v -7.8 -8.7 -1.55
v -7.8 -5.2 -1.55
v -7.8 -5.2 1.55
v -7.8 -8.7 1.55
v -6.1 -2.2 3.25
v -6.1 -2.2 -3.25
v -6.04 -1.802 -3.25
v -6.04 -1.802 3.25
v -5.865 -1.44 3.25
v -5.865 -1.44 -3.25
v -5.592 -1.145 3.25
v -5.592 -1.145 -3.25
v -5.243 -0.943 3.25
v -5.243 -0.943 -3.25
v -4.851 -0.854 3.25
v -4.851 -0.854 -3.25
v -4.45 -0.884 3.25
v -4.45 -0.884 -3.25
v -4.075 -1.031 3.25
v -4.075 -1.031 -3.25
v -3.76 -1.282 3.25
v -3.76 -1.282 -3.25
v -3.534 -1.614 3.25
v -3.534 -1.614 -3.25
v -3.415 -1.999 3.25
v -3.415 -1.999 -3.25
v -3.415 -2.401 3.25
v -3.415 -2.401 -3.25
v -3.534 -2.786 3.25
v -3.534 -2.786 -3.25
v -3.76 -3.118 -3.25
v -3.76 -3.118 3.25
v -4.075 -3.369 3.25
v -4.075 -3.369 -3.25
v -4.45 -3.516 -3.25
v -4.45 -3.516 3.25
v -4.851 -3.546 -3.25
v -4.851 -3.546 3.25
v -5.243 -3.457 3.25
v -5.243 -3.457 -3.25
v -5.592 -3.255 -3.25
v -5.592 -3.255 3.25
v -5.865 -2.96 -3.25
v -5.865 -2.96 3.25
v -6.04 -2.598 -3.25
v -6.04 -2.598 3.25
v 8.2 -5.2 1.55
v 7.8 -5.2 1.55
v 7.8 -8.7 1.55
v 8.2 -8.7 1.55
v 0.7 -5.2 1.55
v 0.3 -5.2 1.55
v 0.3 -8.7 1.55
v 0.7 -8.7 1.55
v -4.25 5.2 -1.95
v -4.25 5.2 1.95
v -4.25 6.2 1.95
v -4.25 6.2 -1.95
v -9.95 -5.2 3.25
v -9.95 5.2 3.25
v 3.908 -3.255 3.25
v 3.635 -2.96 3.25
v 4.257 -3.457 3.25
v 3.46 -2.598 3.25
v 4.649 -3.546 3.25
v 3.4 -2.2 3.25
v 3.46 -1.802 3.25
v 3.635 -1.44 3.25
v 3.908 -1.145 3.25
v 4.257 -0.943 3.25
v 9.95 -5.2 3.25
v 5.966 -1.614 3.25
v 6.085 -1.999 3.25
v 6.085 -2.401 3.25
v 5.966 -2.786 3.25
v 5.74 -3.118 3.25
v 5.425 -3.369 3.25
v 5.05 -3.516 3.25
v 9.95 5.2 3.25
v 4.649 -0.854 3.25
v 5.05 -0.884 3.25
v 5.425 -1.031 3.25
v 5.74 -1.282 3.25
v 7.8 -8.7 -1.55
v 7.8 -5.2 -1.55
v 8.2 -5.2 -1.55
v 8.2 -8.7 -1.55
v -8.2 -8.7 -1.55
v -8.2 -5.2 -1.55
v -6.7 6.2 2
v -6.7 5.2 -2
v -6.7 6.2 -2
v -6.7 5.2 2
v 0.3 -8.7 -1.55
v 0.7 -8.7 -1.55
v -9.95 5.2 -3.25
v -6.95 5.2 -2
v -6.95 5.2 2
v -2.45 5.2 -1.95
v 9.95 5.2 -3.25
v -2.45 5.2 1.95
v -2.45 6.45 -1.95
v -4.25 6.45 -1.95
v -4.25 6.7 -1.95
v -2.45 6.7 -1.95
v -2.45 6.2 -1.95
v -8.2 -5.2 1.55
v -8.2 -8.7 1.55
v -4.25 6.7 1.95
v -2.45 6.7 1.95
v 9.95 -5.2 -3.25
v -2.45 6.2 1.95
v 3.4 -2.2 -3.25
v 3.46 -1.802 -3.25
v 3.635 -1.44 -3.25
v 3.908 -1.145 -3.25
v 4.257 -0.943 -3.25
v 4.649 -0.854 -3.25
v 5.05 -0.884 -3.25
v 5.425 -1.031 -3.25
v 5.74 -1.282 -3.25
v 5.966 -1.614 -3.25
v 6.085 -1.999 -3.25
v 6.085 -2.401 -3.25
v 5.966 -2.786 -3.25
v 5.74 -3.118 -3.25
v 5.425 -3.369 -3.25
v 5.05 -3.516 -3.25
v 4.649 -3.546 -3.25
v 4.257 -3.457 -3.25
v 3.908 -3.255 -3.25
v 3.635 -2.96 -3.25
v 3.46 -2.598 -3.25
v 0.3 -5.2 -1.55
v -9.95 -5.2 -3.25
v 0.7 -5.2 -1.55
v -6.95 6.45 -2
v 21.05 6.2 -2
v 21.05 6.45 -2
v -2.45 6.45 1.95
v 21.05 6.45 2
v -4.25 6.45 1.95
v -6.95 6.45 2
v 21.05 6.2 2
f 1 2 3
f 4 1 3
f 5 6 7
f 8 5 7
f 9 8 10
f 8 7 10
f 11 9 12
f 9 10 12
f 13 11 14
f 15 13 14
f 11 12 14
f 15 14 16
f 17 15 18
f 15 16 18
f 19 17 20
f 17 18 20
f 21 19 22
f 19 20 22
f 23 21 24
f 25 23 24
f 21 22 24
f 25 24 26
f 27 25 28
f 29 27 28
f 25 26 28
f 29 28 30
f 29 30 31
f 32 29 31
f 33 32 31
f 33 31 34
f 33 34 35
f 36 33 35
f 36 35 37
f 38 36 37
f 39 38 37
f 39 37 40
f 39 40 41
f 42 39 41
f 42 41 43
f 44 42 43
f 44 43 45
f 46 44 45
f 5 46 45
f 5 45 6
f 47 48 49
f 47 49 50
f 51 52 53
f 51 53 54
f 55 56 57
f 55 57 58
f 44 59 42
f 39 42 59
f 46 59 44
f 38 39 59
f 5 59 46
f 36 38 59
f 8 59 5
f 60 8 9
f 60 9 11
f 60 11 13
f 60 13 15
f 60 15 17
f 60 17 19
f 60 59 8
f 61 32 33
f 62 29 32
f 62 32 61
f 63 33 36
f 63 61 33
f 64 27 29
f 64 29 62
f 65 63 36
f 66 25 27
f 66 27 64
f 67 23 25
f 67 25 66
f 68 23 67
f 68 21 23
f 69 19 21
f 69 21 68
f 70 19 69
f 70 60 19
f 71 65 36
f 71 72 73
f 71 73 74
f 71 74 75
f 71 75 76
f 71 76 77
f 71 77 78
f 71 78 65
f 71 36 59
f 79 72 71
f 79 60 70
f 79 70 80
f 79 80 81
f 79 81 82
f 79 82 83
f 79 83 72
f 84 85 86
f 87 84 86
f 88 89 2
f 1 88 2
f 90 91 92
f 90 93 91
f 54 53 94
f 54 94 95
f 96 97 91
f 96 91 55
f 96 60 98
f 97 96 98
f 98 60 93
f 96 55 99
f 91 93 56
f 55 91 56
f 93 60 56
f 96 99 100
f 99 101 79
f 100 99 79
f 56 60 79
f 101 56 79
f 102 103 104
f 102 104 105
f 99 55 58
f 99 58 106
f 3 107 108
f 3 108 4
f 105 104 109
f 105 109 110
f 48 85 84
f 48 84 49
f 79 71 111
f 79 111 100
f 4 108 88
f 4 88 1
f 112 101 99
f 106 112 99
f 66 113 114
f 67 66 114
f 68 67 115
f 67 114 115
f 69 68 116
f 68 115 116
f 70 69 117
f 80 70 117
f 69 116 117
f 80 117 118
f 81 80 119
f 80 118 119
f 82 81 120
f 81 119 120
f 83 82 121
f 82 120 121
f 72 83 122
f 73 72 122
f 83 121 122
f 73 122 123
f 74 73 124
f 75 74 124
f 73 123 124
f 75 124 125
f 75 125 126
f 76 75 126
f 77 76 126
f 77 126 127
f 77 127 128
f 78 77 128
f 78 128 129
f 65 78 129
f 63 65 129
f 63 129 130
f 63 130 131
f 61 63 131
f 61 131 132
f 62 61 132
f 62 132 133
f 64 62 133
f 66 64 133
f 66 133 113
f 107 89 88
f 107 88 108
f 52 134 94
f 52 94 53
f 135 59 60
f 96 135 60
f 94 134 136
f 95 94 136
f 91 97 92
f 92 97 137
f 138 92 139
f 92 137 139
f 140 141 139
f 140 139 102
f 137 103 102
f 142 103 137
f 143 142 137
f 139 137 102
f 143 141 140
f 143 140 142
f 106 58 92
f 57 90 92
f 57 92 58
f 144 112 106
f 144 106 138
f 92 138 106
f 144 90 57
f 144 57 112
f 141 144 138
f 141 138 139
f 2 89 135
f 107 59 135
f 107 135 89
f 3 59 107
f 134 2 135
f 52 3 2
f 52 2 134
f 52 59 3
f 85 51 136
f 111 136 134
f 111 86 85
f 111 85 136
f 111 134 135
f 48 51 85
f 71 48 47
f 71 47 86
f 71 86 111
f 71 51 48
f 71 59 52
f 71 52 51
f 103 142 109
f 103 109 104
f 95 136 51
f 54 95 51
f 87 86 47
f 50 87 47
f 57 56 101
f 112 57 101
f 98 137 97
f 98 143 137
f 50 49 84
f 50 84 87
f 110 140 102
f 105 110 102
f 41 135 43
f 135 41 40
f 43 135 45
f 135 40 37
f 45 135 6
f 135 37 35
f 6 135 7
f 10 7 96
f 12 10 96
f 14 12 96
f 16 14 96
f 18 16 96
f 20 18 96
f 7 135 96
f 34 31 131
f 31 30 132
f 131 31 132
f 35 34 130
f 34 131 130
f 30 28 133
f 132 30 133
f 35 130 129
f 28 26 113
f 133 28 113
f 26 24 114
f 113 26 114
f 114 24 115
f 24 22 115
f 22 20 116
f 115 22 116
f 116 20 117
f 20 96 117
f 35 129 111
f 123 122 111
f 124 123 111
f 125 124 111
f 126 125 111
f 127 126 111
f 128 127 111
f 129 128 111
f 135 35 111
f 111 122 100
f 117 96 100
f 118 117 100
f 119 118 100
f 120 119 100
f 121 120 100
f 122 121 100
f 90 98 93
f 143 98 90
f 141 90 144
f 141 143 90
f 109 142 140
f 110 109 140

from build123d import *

# Parameters (mm, degrees)
ESQUISSE1_W        = 19.9
ESQUISSE1_H        = 10.4
BOSS_EXTRU_1_DEPTH = 3.25
D_GAGEMENT_M2_51_D = 2.7
ESQUISSE4_W        = 0.4
ESQUISSE4_H        = 3.1
BOSS_EXTRU_2_DEPTH = 3.5
ESQUISSE5_W        = 1.8
ESQUISSE5_H        = 3.9
BOSS_EXTRU_3_DEPTH = 1.5
BOSS_EXTRU_4_DEPTH = 2


with BuildPart() as part:
    # Esquisse1 → Boss.-Extru.1 (new, symmetric)
    with BuildSketch(Plane.XY):
        Rectangle(ESQUISSE1_W, ESQUISSE1_H)
    extrude(amount=BOSS_EXTRU_1_DEPTH, both=True)

    # Dégagement M2.51 (through all)
    with Locations(Plane.XY.offset(3.25)):
        with Locations((-4.75, -2.2), (4.75, -2.2)):
            Hole(D_GAGEMENT_M2_51_D / 2)

    # Esquisse4 → Boss.-Extru.2 (add)
    with BuildSketch(Plane.XZ.offset(5.2)):
        with Locations((0.5, 0)):
            Rectangle(ESQUISSE4_W, ESQUISSE4_H)
        with Locations((8, 0)):
            Rectangle(ESQUISSE4_W, ESQUISSE4_H)
        with Locations((-8, 0)):
            Rectangle(ESQUISSE4_W, ESQUISSE4_H)
    extrude(amount=BOSS_EXTRU_2_DEPTH)

    # Esquisse5 → Boss.-Extru.3 (add)
    with BuildSketch(Plane(origin=(0, 5.2, 0), x_dir=(1, 0, 0), z_dir=(0, 1, 0))):
        with Locations((-3.35, 0)):
            Rectangle(ESQUISSE5_W, ESQUISSE5_H)
    extrude(amount=BOSS_EXTRU_3_DEPTH)

    # Esquisse6 → Boss.-Extru.4 (add, symmetric)
    with BuildSketch(Plane.XY):
        Polygon((-6.7, 5.2), (-6.7, 6.2), (21.05, 6.2), (21.05, 6.45), (-6.95, 6.45), (-6.95, 5.2), align=None)
    extrude(amount=BOSS_EXTRU_4_DEPTH, both=True)


solid = part.part
